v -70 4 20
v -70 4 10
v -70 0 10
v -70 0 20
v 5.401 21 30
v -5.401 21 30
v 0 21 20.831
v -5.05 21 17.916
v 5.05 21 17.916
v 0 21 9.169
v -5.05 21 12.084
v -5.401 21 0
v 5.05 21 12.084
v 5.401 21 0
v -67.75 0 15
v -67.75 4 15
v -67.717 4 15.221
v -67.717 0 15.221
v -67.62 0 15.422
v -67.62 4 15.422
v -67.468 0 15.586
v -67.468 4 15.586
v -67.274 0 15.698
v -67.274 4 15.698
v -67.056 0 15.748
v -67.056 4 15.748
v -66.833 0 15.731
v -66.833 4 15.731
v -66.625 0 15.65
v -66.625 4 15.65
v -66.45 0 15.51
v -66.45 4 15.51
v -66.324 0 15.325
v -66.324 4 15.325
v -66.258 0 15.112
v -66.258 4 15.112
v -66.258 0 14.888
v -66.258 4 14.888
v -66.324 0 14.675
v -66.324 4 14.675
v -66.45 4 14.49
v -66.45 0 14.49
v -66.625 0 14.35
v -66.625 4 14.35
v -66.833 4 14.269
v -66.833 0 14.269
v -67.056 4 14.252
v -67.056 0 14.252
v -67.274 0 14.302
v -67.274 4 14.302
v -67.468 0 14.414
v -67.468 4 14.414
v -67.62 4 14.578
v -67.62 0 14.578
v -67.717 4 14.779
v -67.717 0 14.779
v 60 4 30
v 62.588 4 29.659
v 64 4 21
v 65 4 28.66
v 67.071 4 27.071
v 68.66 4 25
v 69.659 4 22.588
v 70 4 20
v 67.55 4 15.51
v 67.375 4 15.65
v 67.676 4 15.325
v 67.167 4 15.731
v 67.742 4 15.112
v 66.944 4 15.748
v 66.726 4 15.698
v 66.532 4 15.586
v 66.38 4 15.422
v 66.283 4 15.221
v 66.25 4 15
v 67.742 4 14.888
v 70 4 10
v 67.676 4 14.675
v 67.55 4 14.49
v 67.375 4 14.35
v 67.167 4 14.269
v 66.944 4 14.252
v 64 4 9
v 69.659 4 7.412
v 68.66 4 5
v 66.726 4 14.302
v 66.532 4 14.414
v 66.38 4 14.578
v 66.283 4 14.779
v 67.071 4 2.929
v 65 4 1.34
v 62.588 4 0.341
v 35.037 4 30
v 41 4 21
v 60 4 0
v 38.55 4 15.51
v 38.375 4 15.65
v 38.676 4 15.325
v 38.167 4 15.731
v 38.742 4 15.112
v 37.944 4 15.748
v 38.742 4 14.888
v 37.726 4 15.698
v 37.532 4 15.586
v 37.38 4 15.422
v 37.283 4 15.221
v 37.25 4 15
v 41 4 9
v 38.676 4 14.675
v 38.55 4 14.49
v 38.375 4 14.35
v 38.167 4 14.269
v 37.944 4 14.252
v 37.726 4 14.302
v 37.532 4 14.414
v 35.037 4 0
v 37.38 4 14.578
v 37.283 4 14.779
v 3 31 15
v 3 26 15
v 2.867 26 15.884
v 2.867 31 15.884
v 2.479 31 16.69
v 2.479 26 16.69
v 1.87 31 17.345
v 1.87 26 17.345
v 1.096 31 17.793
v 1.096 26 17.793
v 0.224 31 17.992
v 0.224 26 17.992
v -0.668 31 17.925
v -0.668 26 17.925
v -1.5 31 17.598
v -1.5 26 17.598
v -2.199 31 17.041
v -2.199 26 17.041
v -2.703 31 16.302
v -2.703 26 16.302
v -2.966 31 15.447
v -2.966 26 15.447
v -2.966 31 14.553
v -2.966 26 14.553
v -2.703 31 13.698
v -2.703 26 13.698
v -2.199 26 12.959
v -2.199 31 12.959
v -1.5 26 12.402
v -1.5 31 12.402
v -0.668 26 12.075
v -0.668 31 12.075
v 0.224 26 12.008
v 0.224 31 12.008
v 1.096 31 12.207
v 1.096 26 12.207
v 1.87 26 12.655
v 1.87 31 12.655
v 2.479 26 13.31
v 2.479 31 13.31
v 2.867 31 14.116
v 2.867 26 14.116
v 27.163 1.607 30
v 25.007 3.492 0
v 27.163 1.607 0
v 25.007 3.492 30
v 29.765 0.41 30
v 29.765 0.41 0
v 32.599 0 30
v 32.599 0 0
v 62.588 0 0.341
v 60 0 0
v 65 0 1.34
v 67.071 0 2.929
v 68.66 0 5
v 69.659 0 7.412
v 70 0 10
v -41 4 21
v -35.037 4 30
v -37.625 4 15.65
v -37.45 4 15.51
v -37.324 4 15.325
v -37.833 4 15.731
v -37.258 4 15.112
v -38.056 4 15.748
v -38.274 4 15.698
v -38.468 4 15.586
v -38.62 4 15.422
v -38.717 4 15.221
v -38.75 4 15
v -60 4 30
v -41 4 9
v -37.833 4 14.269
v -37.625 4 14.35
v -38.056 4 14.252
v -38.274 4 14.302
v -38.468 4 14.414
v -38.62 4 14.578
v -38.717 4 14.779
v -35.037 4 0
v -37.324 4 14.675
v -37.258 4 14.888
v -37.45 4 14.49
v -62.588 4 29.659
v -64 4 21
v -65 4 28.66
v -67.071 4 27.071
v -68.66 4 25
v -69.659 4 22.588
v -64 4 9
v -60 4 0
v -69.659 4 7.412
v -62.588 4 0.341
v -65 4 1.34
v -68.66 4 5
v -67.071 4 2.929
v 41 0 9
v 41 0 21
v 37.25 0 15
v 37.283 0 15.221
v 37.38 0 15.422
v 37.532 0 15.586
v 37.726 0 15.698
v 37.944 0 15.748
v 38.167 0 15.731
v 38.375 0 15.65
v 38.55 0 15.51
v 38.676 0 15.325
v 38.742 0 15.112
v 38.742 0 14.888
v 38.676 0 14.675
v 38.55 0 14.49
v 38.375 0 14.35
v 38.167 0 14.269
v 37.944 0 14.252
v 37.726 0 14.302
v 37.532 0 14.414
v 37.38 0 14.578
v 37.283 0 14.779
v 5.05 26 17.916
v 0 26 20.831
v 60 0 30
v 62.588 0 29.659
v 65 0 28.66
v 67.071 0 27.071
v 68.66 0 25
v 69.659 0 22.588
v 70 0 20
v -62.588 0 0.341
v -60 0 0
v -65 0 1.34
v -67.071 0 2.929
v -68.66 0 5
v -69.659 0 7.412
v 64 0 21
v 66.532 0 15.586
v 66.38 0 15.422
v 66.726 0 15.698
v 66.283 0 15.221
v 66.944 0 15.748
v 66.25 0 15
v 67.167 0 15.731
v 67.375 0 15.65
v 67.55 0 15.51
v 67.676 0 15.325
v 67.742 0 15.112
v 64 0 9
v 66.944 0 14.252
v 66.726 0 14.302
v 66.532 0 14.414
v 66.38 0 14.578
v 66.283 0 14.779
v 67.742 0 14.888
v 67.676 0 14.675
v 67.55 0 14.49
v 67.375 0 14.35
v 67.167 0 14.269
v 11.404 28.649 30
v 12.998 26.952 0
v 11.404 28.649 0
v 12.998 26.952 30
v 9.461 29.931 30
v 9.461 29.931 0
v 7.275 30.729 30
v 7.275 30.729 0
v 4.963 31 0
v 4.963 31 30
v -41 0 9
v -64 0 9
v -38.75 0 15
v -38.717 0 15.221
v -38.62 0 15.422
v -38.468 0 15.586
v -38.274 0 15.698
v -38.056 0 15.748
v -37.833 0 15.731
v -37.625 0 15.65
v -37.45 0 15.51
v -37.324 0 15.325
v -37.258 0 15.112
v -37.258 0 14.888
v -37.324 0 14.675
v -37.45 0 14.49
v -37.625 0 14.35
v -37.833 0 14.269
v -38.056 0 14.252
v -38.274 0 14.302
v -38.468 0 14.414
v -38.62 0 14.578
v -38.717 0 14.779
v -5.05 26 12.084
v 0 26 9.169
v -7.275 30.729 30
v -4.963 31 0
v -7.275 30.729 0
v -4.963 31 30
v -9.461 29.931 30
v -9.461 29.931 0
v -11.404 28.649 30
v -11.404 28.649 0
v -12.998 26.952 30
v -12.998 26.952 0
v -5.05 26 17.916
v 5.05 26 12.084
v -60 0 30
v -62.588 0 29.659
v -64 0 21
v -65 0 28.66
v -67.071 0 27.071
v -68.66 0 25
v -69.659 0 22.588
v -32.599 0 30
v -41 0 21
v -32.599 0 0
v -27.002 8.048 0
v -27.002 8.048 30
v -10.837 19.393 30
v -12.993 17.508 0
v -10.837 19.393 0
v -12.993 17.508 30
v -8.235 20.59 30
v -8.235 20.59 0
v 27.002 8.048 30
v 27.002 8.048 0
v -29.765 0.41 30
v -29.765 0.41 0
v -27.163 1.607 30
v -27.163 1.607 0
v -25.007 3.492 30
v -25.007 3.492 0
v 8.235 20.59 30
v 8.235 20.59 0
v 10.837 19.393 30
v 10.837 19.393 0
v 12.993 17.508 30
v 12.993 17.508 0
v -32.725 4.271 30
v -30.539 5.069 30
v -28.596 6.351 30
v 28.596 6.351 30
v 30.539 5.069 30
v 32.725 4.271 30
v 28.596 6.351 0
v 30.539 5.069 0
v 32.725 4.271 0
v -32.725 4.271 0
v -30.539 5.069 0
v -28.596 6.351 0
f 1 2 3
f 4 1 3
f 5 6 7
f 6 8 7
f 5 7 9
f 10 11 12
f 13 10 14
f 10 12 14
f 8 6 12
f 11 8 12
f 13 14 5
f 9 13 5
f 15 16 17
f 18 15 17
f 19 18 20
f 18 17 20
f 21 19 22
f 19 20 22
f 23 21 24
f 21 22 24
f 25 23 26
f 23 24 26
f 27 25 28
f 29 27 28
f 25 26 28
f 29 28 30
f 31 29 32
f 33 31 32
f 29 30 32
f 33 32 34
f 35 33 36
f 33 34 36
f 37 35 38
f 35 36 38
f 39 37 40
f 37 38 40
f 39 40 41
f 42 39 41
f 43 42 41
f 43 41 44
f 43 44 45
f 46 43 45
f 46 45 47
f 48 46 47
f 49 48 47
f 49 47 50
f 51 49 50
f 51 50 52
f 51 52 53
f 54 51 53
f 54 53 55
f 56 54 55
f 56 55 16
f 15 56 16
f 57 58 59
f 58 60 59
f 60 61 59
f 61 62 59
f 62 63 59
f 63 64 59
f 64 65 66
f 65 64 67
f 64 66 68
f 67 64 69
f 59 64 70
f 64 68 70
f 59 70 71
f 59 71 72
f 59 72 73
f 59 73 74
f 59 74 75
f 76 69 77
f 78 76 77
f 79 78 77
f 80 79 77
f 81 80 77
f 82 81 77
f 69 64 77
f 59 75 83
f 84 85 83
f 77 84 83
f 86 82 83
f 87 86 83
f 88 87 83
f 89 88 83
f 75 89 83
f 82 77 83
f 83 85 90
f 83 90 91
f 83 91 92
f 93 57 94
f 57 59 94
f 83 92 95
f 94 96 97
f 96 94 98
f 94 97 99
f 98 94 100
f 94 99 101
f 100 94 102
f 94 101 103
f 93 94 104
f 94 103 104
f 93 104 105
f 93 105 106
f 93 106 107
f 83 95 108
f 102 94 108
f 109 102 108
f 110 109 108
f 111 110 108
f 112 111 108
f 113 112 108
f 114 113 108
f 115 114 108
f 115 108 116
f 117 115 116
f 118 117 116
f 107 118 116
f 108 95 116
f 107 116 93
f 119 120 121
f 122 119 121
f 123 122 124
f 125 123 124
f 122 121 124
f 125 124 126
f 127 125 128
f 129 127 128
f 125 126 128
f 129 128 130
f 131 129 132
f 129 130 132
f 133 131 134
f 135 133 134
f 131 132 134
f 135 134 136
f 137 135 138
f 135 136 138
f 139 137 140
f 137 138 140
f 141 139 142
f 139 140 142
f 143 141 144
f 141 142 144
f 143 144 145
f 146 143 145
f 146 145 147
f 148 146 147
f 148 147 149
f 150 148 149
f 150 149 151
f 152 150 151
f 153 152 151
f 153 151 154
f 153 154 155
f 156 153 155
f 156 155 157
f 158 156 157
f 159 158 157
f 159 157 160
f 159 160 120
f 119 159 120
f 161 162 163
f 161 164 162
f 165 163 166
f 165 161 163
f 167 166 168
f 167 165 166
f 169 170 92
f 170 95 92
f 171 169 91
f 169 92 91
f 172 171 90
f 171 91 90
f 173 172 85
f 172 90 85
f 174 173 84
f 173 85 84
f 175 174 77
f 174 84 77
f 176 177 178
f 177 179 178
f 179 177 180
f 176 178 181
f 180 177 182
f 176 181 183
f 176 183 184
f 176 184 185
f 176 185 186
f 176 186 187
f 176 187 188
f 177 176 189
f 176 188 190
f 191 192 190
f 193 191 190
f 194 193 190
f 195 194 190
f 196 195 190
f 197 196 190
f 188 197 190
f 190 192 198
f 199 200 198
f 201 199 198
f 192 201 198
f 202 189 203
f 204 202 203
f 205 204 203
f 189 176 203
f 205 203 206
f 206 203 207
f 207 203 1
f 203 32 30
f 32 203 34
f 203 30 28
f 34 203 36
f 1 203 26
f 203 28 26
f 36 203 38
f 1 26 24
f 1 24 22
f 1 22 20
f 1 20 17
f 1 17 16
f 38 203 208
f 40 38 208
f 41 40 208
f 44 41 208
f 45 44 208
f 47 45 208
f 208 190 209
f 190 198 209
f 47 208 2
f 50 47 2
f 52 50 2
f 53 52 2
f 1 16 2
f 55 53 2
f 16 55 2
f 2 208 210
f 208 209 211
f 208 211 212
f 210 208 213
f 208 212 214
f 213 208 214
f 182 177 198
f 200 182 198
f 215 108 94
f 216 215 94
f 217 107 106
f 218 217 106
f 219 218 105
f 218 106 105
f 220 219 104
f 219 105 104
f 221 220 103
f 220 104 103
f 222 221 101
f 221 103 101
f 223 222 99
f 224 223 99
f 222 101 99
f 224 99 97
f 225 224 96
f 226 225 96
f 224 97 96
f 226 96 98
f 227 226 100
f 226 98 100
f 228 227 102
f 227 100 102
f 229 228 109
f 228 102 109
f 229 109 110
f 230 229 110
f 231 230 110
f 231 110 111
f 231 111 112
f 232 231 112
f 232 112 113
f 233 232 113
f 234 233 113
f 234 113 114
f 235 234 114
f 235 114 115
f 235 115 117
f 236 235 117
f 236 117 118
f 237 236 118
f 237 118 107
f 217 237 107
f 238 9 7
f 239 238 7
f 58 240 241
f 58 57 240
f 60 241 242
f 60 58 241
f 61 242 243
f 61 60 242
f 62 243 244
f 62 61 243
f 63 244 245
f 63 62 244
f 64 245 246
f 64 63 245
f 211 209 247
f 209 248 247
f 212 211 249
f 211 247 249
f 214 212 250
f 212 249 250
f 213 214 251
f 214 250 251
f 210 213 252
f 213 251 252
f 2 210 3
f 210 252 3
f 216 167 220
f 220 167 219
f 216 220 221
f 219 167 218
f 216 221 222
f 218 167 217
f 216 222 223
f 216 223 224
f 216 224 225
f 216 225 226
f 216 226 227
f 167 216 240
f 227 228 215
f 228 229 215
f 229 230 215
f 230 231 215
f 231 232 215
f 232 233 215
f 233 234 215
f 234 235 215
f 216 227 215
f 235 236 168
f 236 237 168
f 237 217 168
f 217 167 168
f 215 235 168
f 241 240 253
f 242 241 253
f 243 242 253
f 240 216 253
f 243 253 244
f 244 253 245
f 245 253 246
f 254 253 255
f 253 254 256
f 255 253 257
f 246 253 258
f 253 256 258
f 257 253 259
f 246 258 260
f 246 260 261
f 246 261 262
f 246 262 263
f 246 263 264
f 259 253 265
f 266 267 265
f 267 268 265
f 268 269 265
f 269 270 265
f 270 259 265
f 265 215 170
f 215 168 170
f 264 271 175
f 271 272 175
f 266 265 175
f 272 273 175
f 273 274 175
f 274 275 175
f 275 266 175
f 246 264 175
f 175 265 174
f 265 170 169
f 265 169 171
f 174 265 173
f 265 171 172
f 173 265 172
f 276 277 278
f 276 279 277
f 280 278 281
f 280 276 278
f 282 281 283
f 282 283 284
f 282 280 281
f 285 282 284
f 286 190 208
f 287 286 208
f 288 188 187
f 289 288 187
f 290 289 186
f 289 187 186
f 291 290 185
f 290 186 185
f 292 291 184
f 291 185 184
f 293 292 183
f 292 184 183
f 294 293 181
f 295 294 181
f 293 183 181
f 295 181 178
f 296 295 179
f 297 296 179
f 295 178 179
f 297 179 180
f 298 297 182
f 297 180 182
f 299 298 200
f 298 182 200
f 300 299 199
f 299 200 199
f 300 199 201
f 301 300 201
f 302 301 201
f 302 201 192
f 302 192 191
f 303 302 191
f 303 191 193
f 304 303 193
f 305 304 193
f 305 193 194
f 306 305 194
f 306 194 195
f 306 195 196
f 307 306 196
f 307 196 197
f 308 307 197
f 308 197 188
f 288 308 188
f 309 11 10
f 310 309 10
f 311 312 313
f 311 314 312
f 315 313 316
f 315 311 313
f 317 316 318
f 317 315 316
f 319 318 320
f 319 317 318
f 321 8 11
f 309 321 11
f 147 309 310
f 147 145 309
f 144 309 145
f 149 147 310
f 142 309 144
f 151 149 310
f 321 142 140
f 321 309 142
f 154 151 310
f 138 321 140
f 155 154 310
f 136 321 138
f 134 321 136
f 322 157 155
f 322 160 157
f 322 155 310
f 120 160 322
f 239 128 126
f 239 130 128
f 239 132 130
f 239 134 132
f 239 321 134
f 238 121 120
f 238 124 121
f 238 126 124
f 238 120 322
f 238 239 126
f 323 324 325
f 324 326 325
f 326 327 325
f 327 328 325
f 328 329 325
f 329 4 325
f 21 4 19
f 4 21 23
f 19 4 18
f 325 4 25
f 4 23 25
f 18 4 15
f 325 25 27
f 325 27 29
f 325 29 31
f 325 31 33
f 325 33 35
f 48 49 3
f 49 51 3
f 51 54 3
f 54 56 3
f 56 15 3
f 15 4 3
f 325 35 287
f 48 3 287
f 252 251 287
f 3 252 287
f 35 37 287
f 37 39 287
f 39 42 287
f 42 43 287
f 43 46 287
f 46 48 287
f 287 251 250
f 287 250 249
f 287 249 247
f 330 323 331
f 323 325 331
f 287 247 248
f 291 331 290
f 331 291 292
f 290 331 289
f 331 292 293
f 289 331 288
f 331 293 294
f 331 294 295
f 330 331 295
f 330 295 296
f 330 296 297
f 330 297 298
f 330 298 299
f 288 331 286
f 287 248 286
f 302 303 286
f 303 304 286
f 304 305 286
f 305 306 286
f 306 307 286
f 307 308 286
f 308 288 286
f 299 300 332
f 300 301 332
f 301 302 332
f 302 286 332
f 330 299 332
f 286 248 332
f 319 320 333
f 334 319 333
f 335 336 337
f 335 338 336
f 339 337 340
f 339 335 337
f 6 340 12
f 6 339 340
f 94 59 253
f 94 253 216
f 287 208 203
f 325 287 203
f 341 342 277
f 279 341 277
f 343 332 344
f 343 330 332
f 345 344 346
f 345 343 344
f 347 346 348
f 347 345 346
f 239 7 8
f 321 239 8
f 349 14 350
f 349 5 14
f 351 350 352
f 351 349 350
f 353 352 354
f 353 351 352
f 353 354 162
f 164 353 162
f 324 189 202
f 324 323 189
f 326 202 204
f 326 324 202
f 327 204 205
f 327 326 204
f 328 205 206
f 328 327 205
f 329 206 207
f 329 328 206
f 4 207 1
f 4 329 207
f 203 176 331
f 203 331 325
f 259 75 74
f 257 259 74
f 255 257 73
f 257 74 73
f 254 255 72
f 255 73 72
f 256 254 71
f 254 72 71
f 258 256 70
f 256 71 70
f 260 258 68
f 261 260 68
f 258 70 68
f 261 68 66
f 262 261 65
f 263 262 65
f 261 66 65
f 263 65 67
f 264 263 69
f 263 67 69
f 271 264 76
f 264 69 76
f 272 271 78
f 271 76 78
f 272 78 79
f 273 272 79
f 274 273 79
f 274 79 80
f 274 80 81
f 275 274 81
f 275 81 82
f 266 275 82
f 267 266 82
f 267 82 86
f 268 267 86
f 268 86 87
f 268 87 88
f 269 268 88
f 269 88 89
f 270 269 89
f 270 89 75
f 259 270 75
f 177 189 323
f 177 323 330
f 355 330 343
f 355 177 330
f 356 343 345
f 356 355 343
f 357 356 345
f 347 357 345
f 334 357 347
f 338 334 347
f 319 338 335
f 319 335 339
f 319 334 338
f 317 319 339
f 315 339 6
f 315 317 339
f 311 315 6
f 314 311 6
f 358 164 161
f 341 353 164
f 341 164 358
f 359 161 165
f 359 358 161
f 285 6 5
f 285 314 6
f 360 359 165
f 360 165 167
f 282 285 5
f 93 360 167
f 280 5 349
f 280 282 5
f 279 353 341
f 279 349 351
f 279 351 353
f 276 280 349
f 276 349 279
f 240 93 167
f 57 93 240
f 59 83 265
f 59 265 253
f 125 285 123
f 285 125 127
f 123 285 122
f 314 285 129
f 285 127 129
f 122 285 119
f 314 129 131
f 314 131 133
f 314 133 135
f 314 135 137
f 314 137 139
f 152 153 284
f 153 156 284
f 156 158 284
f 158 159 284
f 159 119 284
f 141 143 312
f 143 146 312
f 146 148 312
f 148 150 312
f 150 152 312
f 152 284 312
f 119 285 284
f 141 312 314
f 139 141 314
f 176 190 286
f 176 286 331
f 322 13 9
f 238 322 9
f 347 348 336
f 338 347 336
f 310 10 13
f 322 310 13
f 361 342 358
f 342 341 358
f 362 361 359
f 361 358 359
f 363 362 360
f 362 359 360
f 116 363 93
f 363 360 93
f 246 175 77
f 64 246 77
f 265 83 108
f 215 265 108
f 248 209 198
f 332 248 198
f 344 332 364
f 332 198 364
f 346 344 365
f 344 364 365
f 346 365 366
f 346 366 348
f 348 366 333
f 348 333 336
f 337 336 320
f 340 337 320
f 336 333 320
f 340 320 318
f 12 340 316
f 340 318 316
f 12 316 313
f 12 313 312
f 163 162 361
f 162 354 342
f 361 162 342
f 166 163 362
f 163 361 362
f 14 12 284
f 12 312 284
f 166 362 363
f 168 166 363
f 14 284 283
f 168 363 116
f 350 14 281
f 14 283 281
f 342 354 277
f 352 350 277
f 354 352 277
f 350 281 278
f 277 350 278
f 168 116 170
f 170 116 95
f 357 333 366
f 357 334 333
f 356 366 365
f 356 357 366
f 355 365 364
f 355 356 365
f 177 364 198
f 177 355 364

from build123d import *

# Parameters (mm, degrees)
F1_DEPTH = 30
F2_W     = 23
F2_H     = 12
F2_R     = 0.75
F3_DEPTH = 25
F4_R     = 10
F5_R     = 3
F6_DEPTH = 25
F7_DEPTH = 5


# Not quite as in the source:
# - a feature names something its author has since deleted; it is built from what else it names


with BuildPart() as f1:
    # F0 (on Top) → F1 (new body)
    with BuildSketch(Plane.XY):
        Polygon((30, 4), (10, 31), (-10, 31), (-30, 4), (-70, 4), (-70, 0), (-28, 0), (-10, 21), (10, 21), (28, 0), (70, 0), (70, 4), align=None)
    extrude(amount=F1_DEPTH)

    # F2 (on face) → F3 (cut)
    with BuildSketch(Plane(origin=(0, 4, 0), x_dir=(-1, 0, 0), z_dir=(0, 1, 0))):
        with Locations((52.5, 15)):
            Rectangle(F2_W, F2_H)
        with Locations((-52.5, 15)):
            Rectangle(F2_W, F2_H)
        with Locations((-38, 15)):
            Circle(F2_R)
        with Locations((-67, 15)):
            Circle(F2_R)
        with Locations((38, 15)):
            Circle(F2_R)
        with Locations((67, 15)):
            Circle(F2_R)
    extrude(amount=-F3_DEPTH, mode=Mode.SUBTRACT)

    # F4
    f4_edges = [f1.edges().sort_by_distance(p)[0] for p in [
        (-70, 2, 30),
        (-70, 2, 0),
        (70, 2, 30),
        (70, 2, 0),
        (30, 4, 15),
        (-30, 4, 15),
        (-10, 31, 15),
        (10, 31, 15),
        (-28, 0, 15),
        (-10, 21, 15),
        (10, 21, 15),
        (28, 0, 15),
    ]]
    fillet(f4_edges, radius=F4_R)

    # F5 (on face) → F6 (cut)
    with BuildSketch(Plane.XZ.offset(-21)):
        with Locations((0, 15)):
            Circle(F5_R)
    extrude(amount=-F6_DEPTH, mode=Mode.SUBTRACT)

    # F5 (on face) → F7 (cut)
    with BuildSketch(Plane.XZ.offset(-21)):
        Polygon((0, 9.1687622812), (5.05, 12.0843811406), (5.05, 17.9156188594), (0, 20.8312377188), (-5.05, 17.9156188594), (-5.05, 12.0843811406), align=None)
        with Locations((0, 15)):
            Circle(F5_R, mode=Mode.SUBTRACT)
    extrude(amount=-F7_DEPTH, mode=Mode.SUBTRACT)


solid = f1.part
